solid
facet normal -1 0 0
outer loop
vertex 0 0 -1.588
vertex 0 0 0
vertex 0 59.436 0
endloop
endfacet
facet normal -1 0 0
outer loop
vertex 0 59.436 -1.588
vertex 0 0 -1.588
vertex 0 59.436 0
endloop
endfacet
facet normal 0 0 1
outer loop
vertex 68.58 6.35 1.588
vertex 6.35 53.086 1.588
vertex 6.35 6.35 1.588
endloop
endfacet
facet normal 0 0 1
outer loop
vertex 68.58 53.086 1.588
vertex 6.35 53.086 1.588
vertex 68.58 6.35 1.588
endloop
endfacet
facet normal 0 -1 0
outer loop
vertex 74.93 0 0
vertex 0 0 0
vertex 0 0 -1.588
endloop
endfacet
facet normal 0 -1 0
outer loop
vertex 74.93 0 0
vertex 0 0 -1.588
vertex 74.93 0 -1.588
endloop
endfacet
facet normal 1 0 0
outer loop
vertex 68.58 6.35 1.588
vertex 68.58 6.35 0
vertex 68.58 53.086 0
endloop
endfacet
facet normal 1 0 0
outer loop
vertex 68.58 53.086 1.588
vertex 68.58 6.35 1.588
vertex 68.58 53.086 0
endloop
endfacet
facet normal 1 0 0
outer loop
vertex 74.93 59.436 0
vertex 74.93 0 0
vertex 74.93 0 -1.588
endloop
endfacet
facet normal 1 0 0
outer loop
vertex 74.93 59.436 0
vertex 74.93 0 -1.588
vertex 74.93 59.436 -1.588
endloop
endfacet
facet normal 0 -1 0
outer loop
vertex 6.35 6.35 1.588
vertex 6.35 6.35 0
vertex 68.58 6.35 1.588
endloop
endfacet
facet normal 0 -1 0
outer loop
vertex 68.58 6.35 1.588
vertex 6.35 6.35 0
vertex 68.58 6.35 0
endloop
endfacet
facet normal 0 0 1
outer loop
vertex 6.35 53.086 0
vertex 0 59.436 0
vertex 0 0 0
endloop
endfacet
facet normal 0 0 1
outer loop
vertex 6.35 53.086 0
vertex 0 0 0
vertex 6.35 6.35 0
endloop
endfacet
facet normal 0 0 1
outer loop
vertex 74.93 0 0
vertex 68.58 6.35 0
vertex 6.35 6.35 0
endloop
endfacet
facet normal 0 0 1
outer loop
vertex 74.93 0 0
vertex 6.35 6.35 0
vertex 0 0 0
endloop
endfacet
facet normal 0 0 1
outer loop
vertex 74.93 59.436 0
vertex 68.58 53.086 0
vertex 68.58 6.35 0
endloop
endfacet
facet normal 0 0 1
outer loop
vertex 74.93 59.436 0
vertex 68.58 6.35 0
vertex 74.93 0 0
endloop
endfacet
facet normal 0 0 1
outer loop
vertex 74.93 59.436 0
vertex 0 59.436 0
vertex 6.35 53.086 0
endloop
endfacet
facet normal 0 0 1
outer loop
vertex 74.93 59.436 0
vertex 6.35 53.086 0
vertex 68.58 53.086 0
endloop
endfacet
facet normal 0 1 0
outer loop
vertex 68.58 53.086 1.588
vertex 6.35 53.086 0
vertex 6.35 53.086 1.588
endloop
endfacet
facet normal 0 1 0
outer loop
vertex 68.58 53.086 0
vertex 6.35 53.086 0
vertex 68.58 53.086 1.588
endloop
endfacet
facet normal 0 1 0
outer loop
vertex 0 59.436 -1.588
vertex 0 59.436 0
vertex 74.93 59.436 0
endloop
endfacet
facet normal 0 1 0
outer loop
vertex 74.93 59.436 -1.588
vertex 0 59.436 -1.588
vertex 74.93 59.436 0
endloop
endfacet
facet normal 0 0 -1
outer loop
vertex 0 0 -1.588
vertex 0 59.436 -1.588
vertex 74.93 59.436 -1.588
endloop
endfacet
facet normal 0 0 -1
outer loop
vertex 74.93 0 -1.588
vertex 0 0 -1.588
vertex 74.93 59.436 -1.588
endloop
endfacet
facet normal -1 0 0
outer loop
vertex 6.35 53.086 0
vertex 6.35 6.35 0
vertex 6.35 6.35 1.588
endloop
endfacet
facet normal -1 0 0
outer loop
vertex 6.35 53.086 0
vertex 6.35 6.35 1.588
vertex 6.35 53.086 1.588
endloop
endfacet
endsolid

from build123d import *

# Parameters (mm, degrees)
SKETCH1_W      = 74.93
SKETCH1_H      = 59.436
EXTRUDE1_DEPTH = 1.5875
SKETCH2_W      = 62.23
SKETCH2_H      = 46.736
EXTRUDE2_DEPTH = 1.5875


with BuildPart() as part:
    # Sketch1 → Extrude1 (new body)
    with BuildSketch(Plane.XY):
        with Locations((37.465, 29.718)):
            Rectangle(SKETCH1_W, SKETCH1_H)
    extrude(amount=-EXTRUDE1_DEPTH)

    # Sketch2 → Extrude2 (add)
    with BuildSketch(Plane.XY):
        with Locations((37.465, 29.718)):
            Rectangle(SKETCH2_W, SKETCH2_H)
    extrude(amount=EXTRUDE2_DEPTH)


solid = part.part
